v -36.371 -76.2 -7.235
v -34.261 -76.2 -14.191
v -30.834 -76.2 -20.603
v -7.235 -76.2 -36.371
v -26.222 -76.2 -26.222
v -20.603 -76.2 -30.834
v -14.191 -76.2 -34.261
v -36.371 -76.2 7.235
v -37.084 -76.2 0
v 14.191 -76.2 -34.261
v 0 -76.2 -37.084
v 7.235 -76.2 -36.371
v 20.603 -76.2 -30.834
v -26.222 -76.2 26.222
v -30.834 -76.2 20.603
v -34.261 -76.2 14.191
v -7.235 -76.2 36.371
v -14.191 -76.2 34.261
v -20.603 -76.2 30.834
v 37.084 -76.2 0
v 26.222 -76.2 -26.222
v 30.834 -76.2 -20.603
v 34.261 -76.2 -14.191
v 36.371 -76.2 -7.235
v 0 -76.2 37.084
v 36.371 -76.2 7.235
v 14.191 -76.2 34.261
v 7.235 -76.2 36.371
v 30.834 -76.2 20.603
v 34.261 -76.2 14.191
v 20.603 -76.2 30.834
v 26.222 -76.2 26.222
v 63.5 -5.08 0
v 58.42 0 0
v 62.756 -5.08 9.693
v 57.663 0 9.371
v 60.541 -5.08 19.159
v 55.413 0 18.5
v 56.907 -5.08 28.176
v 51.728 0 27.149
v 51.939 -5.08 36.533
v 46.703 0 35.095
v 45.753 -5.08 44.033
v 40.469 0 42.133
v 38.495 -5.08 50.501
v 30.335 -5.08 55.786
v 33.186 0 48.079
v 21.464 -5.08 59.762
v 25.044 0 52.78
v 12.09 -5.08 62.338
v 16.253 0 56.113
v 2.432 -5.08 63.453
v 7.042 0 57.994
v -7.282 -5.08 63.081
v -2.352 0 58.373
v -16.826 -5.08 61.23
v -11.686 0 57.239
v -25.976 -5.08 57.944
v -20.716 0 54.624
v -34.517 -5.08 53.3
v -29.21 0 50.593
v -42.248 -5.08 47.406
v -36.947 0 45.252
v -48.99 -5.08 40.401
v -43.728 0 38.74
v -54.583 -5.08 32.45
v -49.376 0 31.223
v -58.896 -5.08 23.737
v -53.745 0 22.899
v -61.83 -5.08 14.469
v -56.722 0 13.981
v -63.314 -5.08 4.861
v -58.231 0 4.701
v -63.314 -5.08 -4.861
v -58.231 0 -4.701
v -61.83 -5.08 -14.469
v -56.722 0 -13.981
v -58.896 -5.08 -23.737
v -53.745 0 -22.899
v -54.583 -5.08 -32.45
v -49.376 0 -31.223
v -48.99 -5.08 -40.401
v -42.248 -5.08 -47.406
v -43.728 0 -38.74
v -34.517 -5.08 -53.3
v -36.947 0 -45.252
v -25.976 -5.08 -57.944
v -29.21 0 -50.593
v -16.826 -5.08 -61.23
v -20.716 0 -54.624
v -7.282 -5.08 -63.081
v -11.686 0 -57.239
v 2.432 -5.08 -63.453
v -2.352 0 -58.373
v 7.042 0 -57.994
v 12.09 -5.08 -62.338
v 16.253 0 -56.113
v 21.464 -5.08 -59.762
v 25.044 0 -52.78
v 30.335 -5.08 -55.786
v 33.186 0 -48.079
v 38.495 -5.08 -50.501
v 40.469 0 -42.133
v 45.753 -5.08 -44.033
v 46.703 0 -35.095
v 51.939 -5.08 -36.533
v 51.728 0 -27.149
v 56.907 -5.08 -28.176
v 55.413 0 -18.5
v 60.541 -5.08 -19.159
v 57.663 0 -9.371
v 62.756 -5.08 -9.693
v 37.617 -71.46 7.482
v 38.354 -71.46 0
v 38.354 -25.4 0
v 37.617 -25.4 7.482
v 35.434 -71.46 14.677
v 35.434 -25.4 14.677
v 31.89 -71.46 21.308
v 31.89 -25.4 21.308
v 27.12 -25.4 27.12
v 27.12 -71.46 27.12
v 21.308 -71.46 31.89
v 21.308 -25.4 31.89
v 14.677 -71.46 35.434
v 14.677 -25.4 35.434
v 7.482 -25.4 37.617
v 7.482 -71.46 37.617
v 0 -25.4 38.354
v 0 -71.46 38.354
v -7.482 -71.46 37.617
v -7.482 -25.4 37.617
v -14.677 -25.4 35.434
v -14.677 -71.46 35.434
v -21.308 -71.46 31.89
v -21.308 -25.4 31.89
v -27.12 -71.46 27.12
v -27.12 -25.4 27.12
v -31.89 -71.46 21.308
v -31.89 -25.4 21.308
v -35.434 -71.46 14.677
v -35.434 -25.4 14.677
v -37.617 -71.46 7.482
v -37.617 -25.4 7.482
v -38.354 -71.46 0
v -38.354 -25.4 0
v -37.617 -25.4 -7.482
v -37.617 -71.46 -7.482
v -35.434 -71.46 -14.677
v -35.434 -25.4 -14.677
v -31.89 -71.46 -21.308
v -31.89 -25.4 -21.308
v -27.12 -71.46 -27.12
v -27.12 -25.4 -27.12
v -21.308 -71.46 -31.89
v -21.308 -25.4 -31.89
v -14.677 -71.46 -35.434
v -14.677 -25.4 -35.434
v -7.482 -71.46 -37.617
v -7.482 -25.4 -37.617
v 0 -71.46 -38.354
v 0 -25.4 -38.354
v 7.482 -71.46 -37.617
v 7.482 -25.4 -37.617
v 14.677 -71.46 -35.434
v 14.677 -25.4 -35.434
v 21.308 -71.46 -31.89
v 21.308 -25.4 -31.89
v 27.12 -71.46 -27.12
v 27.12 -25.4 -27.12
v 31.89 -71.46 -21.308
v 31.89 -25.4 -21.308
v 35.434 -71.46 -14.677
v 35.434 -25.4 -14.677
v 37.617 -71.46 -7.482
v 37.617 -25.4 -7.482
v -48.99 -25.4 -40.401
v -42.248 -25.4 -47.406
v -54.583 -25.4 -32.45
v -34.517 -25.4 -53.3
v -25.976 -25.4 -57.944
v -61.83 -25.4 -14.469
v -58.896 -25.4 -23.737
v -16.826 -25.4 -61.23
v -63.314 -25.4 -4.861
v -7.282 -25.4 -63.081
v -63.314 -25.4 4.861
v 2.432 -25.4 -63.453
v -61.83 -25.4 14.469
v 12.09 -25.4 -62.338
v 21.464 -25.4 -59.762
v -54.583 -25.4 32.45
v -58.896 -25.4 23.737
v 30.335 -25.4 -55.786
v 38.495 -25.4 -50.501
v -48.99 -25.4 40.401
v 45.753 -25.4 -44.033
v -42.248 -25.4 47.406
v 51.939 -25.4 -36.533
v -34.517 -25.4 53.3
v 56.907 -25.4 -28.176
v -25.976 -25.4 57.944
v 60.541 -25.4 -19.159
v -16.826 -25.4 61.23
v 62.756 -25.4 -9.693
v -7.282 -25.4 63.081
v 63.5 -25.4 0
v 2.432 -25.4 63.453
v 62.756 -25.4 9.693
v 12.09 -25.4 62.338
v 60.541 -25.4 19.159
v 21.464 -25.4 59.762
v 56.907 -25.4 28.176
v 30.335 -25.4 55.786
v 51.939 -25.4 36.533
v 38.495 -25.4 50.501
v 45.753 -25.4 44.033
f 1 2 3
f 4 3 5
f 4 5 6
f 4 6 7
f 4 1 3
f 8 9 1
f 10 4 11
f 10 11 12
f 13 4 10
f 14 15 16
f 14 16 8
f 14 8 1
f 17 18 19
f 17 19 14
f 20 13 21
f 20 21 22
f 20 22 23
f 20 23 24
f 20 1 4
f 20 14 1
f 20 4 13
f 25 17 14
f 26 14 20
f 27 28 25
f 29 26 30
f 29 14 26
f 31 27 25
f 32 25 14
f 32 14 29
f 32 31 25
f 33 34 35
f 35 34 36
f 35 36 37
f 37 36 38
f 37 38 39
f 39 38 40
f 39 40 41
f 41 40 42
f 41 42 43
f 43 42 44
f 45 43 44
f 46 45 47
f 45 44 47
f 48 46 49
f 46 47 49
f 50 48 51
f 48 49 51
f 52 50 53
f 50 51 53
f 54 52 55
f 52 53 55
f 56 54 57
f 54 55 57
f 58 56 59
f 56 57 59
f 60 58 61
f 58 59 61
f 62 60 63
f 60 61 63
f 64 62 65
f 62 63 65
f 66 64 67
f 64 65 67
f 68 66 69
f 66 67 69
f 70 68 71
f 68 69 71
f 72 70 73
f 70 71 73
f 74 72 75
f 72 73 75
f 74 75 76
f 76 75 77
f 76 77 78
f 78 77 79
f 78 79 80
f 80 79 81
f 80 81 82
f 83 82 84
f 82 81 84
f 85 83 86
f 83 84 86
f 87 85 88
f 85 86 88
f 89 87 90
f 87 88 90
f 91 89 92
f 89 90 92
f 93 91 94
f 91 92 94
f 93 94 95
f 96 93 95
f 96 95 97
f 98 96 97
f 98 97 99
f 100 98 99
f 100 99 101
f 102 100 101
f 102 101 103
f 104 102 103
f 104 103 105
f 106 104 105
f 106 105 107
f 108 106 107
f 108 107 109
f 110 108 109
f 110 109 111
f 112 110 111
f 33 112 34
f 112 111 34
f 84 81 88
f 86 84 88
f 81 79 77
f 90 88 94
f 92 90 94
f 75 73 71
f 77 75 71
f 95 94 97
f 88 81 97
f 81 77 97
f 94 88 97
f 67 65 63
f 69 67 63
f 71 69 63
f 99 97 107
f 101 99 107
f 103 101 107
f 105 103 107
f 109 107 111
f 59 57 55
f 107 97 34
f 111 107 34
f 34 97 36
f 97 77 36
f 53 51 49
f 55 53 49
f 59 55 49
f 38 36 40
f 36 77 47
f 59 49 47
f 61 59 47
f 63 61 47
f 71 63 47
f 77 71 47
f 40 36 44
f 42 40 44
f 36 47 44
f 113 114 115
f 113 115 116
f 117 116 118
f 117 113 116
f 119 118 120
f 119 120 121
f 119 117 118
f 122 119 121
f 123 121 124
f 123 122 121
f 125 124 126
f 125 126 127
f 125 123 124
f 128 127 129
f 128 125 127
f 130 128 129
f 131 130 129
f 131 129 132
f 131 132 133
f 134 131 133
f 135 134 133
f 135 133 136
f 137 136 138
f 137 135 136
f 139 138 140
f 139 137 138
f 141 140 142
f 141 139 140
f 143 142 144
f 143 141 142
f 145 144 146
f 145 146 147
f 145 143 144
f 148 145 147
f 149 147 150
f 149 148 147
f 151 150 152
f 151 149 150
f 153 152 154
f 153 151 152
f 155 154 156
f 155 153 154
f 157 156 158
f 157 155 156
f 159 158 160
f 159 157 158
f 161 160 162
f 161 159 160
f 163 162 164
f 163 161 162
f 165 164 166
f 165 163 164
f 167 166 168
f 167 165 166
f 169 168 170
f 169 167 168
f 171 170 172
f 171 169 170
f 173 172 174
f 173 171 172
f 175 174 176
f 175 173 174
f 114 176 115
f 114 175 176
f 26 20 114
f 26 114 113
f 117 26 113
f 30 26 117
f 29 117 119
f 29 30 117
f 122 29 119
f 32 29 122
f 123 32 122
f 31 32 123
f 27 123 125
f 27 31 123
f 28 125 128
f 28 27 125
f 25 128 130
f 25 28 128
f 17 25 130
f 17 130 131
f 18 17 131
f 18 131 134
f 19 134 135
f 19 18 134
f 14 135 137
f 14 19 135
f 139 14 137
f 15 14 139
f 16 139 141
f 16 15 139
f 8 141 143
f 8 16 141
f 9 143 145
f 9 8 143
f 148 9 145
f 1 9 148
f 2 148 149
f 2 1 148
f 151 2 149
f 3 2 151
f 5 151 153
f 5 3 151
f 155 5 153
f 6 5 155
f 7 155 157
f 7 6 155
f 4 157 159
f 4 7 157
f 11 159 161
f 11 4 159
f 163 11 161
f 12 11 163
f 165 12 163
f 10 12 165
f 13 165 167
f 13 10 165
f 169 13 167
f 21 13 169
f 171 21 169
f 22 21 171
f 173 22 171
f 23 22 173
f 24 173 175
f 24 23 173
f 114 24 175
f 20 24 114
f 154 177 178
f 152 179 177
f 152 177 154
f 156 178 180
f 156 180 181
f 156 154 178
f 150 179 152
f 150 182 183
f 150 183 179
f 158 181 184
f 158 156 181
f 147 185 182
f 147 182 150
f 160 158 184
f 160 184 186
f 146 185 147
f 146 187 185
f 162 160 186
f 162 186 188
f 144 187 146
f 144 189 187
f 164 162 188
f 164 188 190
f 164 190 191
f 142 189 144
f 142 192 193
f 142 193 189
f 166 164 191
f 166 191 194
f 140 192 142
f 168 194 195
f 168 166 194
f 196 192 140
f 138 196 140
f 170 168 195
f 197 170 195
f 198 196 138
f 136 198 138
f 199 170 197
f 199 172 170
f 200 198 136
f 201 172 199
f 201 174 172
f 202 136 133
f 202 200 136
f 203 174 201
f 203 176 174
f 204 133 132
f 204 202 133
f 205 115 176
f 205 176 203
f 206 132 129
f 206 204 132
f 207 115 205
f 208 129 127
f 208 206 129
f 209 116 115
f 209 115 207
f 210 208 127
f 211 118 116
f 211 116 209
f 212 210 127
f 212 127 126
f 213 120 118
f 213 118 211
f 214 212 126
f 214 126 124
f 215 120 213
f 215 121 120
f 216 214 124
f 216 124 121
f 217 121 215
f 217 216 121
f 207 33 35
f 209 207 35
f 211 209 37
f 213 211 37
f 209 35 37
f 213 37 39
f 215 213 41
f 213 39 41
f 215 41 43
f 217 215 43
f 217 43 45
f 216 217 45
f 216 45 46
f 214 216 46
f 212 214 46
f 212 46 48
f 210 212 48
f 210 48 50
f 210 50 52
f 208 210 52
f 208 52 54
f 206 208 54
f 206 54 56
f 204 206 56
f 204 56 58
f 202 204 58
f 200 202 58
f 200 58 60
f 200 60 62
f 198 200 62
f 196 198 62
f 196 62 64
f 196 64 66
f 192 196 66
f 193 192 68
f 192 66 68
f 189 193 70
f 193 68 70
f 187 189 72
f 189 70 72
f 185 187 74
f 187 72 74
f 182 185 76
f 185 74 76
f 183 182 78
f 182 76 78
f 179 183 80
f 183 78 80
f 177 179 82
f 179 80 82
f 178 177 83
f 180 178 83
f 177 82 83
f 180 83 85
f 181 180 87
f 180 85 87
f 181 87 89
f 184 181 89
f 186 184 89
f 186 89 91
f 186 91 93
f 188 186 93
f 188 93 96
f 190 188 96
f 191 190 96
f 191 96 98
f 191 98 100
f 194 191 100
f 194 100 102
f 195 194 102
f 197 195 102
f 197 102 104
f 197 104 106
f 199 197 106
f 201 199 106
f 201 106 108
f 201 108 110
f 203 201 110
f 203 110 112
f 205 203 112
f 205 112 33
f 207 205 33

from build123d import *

# Parameters (mm, degrees)
F0_R     = 63.5
F1_DEPTH = 76.2
F2_R     = 63.5
F2_R_2   = 38.354
F3_DEPTH = 50.8
F4_SIZE2 = 1.27
F4_SIZE  = 4.7397045256
F5_SIZE  = 5.08


with BuildPart() as f1:
    # F0 (on Front) → F1 (new body)
    with BuildSketch(Plane.XZ):
        Circle(F0_R)
    extrude(amount=F1_DEPTH)

    # F2 (on face) → F3 (cut)
    with BuildSketch(Plane.XZ.offset(76.2)):
        Circle(F2_R)
        Circle(F2_R_2, mode=Mode.SUBTRACT)
    extrude(amount=-F3_DEPTH, mode=Mode.SUBTRACT)

    # F4
    f4_edges = [f1.edges().sort_by_distance(p)[0] for p in [
        (-38.354, -76.2, 0),
    ]]
    f4_side = f1.faces().sort_by_distance((-38.354, -50.8, 0))[0]
    chamfer(f4_edges, length=F4_SIZE, length2=F4_SIZE2, reference=f4_side)

    # F5
    f5_edges = [f1.edges().sort_by_distance(p)[0] for p in [
        (-63.5, 0, 0),
    ]]
    chamfer(f5_edges, length=F5_SIZE)


solid = f1.part
